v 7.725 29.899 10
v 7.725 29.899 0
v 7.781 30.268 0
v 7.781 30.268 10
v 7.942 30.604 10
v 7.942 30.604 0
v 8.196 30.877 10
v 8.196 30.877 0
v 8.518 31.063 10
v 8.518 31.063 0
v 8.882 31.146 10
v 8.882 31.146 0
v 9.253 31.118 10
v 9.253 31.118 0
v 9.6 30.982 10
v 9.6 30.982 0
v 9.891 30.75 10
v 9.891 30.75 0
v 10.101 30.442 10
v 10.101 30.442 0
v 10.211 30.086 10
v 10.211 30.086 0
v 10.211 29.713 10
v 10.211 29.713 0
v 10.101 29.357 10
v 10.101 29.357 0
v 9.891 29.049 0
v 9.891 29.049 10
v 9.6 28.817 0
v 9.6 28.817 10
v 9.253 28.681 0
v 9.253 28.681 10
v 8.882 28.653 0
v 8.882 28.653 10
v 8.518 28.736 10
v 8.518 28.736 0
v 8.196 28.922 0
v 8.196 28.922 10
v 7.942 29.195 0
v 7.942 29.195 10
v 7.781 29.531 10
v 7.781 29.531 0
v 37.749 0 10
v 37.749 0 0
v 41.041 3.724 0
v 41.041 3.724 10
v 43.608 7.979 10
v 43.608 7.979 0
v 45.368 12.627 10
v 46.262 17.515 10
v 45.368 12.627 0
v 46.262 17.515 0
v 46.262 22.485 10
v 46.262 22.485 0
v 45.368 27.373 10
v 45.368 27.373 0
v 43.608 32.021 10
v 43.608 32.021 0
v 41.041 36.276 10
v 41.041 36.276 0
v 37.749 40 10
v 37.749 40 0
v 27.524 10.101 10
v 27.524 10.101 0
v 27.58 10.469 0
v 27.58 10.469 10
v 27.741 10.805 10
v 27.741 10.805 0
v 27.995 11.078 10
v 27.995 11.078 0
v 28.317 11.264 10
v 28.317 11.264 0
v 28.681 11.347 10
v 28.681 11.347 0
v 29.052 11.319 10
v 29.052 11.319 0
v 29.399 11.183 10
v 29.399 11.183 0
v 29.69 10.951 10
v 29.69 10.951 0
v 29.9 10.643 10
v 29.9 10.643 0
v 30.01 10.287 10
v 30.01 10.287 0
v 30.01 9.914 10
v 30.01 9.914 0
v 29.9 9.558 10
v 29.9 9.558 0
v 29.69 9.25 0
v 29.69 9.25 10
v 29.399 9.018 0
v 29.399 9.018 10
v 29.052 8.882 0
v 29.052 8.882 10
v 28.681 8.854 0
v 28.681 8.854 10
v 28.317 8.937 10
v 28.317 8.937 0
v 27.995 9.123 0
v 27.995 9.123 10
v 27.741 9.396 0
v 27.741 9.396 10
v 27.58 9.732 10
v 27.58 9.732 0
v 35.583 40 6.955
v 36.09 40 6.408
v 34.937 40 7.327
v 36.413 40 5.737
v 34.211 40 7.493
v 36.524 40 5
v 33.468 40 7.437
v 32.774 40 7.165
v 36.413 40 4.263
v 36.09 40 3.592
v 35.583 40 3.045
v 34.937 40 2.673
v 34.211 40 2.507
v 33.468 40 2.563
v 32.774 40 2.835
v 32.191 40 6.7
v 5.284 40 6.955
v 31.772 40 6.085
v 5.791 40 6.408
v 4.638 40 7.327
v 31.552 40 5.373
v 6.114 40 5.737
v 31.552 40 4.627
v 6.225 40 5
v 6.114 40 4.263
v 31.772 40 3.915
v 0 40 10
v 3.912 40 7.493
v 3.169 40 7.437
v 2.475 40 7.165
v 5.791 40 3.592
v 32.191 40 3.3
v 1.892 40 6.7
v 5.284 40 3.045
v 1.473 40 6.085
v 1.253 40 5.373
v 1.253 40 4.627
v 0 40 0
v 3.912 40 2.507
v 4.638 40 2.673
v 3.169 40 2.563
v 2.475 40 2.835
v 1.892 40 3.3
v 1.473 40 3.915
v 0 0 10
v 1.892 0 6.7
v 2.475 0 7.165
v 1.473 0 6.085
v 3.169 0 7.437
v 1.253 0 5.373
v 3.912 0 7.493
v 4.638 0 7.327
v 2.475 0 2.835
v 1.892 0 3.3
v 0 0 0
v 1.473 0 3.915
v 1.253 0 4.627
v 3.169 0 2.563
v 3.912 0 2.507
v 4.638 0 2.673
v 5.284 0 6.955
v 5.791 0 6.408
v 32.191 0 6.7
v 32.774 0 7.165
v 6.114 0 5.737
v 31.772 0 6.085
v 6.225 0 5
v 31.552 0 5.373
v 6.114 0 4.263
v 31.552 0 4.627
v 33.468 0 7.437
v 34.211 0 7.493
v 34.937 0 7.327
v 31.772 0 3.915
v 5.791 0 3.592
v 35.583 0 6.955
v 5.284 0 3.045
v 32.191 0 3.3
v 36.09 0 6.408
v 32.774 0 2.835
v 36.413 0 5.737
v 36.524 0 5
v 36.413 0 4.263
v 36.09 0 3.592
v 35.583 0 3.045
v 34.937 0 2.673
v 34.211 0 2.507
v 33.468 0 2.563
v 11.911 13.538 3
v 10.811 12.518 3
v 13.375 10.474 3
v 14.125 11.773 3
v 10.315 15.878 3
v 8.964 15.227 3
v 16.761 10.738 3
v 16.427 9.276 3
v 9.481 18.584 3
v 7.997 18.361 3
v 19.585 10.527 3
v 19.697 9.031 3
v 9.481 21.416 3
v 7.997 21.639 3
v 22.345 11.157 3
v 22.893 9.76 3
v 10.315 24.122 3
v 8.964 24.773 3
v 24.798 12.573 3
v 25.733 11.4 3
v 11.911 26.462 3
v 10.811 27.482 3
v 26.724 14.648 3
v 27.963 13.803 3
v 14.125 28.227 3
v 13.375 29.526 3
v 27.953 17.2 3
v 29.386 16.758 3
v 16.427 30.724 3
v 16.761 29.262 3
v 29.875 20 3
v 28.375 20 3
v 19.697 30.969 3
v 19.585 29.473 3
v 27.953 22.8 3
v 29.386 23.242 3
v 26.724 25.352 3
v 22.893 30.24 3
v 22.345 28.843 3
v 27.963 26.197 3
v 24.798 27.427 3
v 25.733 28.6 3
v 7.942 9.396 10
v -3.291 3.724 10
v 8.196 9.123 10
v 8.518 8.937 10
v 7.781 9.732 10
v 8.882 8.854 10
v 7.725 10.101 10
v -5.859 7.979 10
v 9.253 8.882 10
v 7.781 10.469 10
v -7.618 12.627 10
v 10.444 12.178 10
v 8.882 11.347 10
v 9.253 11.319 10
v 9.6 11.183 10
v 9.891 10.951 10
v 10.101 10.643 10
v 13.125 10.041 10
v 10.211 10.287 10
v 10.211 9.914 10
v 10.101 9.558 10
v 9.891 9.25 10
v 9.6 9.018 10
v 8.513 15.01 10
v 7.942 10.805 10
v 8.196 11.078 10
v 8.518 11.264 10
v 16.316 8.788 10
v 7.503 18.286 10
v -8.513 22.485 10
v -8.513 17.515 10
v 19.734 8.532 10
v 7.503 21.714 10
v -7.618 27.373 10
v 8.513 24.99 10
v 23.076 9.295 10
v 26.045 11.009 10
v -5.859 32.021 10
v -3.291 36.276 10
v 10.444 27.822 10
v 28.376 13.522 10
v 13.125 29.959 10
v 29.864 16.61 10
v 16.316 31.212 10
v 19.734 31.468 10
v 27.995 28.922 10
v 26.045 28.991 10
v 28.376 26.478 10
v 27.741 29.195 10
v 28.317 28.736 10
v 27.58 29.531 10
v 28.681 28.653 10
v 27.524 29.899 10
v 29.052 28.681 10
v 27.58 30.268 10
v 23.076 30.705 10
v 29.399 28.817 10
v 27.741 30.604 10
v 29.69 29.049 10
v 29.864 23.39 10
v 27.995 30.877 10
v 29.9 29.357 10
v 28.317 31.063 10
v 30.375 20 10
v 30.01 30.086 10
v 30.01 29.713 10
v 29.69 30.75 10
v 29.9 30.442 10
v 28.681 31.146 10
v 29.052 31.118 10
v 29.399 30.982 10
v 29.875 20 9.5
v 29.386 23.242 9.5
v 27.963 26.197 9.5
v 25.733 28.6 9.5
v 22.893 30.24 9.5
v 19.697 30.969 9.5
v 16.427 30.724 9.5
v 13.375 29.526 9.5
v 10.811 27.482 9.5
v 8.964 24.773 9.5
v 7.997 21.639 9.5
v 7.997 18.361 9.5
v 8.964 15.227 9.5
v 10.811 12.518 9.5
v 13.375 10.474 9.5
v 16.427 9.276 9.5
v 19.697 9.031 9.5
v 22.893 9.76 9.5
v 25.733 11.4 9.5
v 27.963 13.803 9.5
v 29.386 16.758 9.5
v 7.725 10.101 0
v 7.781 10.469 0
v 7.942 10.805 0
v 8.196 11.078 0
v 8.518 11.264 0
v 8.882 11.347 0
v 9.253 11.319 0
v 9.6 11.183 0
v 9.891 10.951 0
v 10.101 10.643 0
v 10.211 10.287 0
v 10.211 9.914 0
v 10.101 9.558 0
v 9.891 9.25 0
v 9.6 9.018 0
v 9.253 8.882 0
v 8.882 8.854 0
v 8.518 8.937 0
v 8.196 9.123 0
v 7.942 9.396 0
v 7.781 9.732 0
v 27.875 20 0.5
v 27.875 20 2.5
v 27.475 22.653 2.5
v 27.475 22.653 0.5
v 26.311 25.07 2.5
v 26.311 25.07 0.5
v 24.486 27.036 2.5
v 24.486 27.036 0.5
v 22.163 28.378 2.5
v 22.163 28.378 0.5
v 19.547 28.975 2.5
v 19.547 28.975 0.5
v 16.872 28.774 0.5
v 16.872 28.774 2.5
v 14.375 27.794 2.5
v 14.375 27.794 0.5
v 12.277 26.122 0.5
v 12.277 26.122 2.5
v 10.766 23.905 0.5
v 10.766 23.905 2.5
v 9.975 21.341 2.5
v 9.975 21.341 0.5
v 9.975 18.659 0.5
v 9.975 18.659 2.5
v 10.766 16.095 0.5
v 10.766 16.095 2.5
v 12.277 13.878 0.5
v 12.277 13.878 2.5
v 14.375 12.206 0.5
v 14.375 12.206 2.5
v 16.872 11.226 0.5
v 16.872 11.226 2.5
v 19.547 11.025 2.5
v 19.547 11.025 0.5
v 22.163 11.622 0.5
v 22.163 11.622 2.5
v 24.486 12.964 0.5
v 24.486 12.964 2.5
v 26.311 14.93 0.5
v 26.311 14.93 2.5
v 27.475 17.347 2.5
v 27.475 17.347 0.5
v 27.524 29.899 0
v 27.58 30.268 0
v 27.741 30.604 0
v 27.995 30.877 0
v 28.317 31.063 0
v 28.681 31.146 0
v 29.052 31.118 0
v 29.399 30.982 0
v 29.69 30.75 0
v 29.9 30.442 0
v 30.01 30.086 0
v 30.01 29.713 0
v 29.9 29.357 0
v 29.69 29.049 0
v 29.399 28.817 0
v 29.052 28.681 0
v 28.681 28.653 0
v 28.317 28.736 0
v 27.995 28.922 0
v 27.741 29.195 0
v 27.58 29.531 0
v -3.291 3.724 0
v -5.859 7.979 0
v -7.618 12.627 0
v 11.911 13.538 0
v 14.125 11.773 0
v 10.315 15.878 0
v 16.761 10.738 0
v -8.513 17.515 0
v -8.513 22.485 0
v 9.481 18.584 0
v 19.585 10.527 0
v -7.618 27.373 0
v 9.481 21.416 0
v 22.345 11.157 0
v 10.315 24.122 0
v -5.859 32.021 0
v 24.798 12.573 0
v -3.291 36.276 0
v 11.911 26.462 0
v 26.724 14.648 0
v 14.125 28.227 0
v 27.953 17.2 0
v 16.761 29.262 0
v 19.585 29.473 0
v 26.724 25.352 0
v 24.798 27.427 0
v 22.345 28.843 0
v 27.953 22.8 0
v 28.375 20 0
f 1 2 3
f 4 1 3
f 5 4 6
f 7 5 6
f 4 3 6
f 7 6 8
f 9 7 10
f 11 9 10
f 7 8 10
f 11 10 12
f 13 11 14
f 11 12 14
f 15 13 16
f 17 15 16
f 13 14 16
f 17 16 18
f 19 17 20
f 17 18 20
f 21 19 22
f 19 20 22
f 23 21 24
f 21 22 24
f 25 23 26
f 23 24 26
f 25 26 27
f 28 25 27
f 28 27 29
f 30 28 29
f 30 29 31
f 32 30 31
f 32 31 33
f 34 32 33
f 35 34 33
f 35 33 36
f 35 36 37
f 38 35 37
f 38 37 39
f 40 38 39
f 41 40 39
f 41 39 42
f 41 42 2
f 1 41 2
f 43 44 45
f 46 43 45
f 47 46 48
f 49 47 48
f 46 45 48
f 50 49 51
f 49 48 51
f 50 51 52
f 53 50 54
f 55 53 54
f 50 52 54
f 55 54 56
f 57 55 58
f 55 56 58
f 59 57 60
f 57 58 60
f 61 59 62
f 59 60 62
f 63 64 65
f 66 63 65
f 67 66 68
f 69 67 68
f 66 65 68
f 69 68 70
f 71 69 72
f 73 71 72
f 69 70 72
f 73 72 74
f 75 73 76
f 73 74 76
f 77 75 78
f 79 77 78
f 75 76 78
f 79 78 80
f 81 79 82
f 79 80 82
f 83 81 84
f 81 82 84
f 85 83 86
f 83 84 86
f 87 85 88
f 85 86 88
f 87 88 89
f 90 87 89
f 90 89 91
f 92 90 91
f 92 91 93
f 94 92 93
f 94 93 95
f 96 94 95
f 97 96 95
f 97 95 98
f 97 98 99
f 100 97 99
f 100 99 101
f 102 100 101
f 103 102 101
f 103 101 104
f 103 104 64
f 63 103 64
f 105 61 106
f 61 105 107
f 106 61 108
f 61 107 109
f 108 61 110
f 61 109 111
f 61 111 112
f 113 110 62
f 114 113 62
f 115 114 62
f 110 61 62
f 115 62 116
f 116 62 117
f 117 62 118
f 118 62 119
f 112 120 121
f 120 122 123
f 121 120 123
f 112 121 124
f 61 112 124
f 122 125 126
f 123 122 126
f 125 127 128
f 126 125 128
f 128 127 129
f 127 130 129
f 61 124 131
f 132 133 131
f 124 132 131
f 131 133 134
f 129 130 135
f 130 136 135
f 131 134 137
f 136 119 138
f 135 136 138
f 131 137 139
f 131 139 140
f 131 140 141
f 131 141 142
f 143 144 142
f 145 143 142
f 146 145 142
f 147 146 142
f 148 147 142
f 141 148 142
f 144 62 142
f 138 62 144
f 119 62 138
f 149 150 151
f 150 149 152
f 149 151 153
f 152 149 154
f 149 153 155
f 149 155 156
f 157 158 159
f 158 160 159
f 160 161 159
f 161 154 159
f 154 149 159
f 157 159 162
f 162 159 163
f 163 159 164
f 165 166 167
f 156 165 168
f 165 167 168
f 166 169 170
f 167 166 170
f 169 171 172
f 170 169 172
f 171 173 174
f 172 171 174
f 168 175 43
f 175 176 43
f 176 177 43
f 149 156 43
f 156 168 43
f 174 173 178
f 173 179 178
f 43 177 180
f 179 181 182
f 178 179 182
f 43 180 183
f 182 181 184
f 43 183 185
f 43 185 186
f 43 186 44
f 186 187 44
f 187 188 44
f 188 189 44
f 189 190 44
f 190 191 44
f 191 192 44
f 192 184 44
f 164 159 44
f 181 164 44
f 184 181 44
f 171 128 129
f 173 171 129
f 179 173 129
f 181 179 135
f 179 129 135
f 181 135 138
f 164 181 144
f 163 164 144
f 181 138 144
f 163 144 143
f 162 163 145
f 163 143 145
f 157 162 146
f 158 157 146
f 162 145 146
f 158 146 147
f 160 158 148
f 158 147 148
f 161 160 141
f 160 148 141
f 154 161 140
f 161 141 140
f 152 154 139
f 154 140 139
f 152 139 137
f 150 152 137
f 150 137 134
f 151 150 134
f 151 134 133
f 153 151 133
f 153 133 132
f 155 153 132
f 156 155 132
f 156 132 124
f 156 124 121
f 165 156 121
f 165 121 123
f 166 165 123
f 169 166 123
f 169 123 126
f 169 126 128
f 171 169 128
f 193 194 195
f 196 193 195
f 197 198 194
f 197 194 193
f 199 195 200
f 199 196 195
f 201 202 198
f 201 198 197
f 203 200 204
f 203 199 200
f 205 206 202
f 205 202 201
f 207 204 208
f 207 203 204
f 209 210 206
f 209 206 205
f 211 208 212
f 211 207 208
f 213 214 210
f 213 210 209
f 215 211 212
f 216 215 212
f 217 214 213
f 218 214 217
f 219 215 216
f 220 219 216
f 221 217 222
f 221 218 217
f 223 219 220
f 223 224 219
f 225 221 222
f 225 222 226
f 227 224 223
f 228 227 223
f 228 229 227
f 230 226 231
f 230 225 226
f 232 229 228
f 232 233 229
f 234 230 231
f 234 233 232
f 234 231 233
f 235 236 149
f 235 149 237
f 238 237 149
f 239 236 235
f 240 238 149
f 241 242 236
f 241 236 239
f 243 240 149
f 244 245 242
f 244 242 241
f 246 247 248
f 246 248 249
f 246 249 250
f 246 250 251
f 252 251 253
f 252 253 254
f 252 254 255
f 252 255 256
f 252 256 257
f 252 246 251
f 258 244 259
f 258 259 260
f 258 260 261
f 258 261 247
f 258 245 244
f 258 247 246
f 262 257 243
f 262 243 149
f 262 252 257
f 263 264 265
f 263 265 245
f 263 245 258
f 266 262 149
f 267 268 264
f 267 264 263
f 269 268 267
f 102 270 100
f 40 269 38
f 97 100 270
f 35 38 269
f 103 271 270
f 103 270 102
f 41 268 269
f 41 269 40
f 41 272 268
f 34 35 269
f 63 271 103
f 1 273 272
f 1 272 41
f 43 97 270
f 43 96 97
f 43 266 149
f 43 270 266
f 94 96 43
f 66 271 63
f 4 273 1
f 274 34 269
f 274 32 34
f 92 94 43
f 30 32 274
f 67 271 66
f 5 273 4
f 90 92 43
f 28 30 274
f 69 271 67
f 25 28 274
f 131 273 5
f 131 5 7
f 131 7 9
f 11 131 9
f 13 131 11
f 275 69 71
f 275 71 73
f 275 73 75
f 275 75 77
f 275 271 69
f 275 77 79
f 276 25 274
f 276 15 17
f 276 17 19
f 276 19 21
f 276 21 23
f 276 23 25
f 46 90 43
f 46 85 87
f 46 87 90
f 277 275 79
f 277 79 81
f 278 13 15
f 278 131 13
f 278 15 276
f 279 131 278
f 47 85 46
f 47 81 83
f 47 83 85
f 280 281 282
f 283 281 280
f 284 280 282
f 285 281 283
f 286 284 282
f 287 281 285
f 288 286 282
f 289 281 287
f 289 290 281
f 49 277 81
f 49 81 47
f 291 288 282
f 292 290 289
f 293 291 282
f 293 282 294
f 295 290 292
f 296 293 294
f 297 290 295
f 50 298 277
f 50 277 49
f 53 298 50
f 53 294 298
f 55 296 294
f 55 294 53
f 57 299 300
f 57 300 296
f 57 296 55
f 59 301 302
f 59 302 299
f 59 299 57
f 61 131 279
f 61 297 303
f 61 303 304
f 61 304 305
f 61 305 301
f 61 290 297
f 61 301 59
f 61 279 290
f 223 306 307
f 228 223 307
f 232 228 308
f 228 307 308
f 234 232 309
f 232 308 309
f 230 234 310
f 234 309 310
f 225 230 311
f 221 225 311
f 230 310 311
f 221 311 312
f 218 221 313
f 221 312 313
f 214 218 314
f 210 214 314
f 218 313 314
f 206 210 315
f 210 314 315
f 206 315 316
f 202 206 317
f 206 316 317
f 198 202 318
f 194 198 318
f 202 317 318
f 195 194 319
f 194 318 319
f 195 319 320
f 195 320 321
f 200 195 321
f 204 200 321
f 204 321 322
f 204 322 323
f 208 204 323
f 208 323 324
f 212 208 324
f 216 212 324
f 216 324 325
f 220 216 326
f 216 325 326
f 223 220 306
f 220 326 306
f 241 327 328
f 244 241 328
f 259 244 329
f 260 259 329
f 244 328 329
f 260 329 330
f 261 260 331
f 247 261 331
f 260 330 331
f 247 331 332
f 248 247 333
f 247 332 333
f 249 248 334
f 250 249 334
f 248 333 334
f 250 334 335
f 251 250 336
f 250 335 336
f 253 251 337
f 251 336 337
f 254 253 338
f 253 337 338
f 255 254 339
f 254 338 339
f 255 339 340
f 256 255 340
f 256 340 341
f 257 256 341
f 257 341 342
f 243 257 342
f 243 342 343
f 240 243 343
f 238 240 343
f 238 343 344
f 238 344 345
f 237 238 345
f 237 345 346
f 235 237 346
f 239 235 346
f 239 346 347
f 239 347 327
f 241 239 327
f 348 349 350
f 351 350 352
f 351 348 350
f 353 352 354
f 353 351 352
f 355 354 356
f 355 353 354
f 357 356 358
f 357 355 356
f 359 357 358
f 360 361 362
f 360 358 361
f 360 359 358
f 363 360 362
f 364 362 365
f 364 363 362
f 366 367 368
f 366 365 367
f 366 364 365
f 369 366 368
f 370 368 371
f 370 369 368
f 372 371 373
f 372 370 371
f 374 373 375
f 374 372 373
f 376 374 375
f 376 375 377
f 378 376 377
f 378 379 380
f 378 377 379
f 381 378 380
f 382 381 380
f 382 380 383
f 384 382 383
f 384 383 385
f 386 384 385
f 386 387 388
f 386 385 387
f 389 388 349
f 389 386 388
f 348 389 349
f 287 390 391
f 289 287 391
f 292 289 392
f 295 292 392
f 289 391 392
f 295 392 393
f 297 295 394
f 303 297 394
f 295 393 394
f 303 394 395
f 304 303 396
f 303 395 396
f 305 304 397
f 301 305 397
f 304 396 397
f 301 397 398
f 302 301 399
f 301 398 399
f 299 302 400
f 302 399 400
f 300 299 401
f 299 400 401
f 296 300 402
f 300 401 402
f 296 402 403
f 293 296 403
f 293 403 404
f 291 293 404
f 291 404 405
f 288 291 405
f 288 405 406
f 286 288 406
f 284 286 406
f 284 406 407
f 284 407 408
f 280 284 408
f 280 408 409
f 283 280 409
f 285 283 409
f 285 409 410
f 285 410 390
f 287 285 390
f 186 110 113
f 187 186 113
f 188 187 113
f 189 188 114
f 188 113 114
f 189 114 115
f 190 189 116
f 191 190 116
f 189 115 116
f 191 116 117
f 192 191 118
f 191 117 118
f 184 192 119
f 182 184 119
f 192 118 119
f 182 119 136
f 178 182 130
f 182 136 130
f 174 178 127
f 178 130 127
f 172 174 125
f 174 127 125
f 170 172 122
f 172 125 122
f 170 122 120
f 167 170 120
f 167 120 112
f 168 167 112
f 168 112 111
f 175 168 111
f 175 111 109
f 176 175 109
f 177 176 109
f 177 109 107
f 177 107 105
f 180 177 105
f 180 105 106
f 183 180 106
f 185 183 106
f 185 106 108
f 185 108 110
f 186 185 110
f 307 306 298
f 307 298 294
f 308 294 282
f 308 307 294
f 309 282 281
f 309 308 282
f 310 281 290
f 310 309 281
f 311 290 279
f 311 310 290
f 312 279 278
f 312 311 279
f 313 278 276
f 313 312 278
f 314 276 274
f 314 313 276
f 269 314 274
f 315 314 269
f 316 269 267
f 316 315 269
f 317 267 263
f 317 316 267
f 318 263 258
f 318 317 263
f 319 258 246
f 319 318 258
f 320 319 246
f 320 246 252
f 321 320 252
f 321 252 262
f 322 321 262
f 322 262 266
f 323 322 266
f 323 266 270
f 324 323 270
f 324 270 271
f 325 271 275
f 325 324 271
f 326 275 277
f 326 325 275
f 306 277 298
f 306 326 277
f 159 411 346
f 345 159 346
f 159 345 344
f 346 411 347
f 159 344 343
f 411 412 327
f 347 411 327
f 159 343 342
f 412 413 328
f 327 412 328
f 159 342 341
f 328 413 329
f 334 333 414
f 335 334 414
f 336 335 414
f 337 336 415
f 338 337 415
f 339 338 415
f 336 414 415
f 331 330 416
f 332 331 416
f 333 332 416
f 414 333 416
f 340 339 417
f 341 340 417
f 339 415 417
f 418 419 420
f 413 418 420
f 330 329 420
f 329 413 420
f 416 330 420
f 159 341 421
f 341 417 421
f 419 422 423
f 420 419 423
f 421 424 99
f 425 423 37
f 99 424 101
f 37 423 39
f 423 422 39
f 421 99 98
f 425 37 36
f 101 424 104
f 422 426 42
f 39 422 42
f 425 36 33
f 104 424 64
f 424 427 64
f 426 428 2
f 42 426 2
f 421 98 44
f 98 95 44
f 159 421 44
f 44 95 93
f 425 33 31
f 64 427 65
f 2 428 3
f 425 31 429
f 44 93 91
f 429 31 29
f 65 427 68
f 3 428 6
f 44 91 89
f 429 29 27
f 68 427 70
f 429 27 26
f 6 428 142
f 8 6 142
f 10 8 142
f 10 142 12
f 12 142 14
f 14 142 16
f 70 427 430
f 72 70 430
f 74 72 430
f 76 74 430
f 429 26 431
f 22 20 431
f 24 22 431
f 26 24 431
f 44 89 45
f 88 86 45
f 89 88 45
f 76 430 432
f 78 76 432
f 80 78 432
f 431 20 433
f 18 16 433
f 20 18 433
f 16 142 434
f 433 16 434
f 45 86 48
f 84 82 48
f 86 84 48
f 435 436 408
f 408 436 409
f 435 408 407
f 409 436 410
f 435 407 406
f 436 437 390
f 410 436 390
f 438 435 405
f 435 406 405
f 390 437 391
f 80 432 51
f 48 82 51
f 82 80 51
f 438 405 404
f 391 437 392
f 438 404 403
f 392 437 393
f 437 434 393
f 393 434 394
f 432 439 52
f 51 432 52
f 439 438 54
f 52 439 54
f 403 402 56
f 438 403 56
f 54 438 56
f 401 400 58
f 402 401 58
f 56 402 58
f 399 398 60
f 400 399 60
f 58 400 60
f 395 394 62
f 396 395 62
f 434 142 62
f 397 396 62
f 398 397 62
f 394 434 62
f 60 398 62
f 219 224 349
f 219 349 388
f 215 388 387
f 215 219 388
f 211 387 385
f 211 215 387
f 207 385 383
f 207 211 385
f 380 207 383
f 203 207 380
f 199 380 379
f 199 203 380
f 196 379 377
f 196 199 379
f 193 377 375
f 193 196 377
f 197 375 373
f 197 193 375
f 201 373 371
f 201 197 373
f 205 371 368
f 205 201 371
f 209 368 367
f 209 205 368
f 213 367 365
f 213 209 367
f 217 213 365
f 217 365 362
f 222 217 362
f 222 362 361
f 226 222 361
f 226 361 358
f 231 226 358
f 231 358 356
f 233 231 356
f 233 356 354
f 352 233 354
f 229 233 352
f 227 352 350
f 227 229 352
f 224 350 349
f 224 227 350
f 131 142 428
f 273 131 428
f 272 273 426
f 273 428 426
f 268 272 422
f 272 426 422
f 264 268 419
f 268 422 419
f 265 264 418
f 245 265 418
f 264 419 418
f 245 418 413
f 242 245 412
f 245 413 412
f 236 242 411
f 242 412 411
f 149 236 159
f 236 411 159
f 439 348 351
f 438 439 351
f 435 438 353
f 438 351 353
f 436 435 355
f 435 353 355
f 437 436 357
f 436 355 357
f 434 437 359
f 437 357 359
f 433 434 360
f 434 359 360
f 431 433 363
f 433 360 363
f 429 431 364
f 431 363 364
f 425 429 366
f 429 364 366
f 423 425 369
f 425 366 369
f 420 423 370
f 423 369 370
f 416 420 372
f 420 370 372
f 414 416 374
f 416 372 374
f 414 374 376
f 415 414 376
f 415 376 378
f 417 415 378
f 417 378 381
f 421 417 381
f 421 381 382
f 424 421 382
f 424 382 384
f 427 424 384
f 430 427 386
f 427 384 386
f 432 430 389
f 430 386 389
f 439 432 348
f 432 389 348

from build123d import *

# Parameters (mm, degrees)
ESQUISSE1_R             = 9
EXTRUSION1_DEPTH        = 10
ESQUISSE2_R             = 11
ENL_V_MAT_EXTRU_1_DEPTH = 7
CHANFREIN1_SIZE         = 0.5
TROU_TARAUD_M31_D       = 2.5
TROU_TARAUD_M31_DEPTH   = 10
ESQUISSE7_R             = 2.5
ENL_V_MAT_EXTRU_2_DEPTH = 41


with BuildPart() as part:
    # Esquisse1 → Extrusion1 (new body)
    with BuildSketch(Plane.XY):
        with BuildLine():
            Line((0, 0), (37.749172176, 0))
            ThreePointArc((37.749172176, 0), (46.374586088, 20), (37.749172176, 40))
            Line((37.749172176, 40), (0, 40))
            ThreePointArc((0, 40), (-8.625413912, 20), (0, 0))
        make_face()
        with Locations((18.874586088, 20)):
            Circle(ESQUISSE1_R, mode=Mode.SUBTRACT)
    extrude(amount=EXTRUSION1_DEPTH)

    # Esquisse2 → Enlèv. mat.-Extru.1 (cut)
    with BuildSketch(Plane.XY.offset(10)):
        with Locations((18.874586088, 20)):
            Circle(ESQUISSE2_R)
    extrude(amount=-ENL_V_MAT_EXTRU_1_DEPTH, mode=Mode.SUBTRACT)

    # Chanfrein1
    chanfrein1_edges = [part.edges().sort_by_distance(p)[0] for p in [
        (9.874586088, 20, 0),
        (9.874586088, 20, 3),
        (7.874586088, 20, 10),
    ]]
    chamfer(chanfrein1_edges, length=CHANFREIN1_SIZE)

    # Trou taraudé M31
    with Locations(Plane.XY.offset(10)):
        with Locations((28.774081025, 29.899494937), (8.975091152, 29.899494937), (8.975091152, 10.100505063), (28.774081025, 10.100505063)):
            Hole(TROU_TARAUD_M31_D / 2, depth=TROU_TARAUD_M31_DEPTH)

    # Esquisse7 → Enlèv. mat.-Extru.2 (cut, through all)
    with BuildSketch(Plane(origin=(0, 40, 0), x_dir=(1, 0, 0), z_dir=(0, 1, 0))):
        with Locations((3.725091152, -5)):
            Circle(ESQUISSE7_R)
        with Locations((34.024081025, -5)):
            Circle(ESQUISSE7_R)
    extrude(amount=-ENL_V_MAT_EXTRU_2_DEPTH, mode=Mode.SUBTRACT)


solid = part.part
